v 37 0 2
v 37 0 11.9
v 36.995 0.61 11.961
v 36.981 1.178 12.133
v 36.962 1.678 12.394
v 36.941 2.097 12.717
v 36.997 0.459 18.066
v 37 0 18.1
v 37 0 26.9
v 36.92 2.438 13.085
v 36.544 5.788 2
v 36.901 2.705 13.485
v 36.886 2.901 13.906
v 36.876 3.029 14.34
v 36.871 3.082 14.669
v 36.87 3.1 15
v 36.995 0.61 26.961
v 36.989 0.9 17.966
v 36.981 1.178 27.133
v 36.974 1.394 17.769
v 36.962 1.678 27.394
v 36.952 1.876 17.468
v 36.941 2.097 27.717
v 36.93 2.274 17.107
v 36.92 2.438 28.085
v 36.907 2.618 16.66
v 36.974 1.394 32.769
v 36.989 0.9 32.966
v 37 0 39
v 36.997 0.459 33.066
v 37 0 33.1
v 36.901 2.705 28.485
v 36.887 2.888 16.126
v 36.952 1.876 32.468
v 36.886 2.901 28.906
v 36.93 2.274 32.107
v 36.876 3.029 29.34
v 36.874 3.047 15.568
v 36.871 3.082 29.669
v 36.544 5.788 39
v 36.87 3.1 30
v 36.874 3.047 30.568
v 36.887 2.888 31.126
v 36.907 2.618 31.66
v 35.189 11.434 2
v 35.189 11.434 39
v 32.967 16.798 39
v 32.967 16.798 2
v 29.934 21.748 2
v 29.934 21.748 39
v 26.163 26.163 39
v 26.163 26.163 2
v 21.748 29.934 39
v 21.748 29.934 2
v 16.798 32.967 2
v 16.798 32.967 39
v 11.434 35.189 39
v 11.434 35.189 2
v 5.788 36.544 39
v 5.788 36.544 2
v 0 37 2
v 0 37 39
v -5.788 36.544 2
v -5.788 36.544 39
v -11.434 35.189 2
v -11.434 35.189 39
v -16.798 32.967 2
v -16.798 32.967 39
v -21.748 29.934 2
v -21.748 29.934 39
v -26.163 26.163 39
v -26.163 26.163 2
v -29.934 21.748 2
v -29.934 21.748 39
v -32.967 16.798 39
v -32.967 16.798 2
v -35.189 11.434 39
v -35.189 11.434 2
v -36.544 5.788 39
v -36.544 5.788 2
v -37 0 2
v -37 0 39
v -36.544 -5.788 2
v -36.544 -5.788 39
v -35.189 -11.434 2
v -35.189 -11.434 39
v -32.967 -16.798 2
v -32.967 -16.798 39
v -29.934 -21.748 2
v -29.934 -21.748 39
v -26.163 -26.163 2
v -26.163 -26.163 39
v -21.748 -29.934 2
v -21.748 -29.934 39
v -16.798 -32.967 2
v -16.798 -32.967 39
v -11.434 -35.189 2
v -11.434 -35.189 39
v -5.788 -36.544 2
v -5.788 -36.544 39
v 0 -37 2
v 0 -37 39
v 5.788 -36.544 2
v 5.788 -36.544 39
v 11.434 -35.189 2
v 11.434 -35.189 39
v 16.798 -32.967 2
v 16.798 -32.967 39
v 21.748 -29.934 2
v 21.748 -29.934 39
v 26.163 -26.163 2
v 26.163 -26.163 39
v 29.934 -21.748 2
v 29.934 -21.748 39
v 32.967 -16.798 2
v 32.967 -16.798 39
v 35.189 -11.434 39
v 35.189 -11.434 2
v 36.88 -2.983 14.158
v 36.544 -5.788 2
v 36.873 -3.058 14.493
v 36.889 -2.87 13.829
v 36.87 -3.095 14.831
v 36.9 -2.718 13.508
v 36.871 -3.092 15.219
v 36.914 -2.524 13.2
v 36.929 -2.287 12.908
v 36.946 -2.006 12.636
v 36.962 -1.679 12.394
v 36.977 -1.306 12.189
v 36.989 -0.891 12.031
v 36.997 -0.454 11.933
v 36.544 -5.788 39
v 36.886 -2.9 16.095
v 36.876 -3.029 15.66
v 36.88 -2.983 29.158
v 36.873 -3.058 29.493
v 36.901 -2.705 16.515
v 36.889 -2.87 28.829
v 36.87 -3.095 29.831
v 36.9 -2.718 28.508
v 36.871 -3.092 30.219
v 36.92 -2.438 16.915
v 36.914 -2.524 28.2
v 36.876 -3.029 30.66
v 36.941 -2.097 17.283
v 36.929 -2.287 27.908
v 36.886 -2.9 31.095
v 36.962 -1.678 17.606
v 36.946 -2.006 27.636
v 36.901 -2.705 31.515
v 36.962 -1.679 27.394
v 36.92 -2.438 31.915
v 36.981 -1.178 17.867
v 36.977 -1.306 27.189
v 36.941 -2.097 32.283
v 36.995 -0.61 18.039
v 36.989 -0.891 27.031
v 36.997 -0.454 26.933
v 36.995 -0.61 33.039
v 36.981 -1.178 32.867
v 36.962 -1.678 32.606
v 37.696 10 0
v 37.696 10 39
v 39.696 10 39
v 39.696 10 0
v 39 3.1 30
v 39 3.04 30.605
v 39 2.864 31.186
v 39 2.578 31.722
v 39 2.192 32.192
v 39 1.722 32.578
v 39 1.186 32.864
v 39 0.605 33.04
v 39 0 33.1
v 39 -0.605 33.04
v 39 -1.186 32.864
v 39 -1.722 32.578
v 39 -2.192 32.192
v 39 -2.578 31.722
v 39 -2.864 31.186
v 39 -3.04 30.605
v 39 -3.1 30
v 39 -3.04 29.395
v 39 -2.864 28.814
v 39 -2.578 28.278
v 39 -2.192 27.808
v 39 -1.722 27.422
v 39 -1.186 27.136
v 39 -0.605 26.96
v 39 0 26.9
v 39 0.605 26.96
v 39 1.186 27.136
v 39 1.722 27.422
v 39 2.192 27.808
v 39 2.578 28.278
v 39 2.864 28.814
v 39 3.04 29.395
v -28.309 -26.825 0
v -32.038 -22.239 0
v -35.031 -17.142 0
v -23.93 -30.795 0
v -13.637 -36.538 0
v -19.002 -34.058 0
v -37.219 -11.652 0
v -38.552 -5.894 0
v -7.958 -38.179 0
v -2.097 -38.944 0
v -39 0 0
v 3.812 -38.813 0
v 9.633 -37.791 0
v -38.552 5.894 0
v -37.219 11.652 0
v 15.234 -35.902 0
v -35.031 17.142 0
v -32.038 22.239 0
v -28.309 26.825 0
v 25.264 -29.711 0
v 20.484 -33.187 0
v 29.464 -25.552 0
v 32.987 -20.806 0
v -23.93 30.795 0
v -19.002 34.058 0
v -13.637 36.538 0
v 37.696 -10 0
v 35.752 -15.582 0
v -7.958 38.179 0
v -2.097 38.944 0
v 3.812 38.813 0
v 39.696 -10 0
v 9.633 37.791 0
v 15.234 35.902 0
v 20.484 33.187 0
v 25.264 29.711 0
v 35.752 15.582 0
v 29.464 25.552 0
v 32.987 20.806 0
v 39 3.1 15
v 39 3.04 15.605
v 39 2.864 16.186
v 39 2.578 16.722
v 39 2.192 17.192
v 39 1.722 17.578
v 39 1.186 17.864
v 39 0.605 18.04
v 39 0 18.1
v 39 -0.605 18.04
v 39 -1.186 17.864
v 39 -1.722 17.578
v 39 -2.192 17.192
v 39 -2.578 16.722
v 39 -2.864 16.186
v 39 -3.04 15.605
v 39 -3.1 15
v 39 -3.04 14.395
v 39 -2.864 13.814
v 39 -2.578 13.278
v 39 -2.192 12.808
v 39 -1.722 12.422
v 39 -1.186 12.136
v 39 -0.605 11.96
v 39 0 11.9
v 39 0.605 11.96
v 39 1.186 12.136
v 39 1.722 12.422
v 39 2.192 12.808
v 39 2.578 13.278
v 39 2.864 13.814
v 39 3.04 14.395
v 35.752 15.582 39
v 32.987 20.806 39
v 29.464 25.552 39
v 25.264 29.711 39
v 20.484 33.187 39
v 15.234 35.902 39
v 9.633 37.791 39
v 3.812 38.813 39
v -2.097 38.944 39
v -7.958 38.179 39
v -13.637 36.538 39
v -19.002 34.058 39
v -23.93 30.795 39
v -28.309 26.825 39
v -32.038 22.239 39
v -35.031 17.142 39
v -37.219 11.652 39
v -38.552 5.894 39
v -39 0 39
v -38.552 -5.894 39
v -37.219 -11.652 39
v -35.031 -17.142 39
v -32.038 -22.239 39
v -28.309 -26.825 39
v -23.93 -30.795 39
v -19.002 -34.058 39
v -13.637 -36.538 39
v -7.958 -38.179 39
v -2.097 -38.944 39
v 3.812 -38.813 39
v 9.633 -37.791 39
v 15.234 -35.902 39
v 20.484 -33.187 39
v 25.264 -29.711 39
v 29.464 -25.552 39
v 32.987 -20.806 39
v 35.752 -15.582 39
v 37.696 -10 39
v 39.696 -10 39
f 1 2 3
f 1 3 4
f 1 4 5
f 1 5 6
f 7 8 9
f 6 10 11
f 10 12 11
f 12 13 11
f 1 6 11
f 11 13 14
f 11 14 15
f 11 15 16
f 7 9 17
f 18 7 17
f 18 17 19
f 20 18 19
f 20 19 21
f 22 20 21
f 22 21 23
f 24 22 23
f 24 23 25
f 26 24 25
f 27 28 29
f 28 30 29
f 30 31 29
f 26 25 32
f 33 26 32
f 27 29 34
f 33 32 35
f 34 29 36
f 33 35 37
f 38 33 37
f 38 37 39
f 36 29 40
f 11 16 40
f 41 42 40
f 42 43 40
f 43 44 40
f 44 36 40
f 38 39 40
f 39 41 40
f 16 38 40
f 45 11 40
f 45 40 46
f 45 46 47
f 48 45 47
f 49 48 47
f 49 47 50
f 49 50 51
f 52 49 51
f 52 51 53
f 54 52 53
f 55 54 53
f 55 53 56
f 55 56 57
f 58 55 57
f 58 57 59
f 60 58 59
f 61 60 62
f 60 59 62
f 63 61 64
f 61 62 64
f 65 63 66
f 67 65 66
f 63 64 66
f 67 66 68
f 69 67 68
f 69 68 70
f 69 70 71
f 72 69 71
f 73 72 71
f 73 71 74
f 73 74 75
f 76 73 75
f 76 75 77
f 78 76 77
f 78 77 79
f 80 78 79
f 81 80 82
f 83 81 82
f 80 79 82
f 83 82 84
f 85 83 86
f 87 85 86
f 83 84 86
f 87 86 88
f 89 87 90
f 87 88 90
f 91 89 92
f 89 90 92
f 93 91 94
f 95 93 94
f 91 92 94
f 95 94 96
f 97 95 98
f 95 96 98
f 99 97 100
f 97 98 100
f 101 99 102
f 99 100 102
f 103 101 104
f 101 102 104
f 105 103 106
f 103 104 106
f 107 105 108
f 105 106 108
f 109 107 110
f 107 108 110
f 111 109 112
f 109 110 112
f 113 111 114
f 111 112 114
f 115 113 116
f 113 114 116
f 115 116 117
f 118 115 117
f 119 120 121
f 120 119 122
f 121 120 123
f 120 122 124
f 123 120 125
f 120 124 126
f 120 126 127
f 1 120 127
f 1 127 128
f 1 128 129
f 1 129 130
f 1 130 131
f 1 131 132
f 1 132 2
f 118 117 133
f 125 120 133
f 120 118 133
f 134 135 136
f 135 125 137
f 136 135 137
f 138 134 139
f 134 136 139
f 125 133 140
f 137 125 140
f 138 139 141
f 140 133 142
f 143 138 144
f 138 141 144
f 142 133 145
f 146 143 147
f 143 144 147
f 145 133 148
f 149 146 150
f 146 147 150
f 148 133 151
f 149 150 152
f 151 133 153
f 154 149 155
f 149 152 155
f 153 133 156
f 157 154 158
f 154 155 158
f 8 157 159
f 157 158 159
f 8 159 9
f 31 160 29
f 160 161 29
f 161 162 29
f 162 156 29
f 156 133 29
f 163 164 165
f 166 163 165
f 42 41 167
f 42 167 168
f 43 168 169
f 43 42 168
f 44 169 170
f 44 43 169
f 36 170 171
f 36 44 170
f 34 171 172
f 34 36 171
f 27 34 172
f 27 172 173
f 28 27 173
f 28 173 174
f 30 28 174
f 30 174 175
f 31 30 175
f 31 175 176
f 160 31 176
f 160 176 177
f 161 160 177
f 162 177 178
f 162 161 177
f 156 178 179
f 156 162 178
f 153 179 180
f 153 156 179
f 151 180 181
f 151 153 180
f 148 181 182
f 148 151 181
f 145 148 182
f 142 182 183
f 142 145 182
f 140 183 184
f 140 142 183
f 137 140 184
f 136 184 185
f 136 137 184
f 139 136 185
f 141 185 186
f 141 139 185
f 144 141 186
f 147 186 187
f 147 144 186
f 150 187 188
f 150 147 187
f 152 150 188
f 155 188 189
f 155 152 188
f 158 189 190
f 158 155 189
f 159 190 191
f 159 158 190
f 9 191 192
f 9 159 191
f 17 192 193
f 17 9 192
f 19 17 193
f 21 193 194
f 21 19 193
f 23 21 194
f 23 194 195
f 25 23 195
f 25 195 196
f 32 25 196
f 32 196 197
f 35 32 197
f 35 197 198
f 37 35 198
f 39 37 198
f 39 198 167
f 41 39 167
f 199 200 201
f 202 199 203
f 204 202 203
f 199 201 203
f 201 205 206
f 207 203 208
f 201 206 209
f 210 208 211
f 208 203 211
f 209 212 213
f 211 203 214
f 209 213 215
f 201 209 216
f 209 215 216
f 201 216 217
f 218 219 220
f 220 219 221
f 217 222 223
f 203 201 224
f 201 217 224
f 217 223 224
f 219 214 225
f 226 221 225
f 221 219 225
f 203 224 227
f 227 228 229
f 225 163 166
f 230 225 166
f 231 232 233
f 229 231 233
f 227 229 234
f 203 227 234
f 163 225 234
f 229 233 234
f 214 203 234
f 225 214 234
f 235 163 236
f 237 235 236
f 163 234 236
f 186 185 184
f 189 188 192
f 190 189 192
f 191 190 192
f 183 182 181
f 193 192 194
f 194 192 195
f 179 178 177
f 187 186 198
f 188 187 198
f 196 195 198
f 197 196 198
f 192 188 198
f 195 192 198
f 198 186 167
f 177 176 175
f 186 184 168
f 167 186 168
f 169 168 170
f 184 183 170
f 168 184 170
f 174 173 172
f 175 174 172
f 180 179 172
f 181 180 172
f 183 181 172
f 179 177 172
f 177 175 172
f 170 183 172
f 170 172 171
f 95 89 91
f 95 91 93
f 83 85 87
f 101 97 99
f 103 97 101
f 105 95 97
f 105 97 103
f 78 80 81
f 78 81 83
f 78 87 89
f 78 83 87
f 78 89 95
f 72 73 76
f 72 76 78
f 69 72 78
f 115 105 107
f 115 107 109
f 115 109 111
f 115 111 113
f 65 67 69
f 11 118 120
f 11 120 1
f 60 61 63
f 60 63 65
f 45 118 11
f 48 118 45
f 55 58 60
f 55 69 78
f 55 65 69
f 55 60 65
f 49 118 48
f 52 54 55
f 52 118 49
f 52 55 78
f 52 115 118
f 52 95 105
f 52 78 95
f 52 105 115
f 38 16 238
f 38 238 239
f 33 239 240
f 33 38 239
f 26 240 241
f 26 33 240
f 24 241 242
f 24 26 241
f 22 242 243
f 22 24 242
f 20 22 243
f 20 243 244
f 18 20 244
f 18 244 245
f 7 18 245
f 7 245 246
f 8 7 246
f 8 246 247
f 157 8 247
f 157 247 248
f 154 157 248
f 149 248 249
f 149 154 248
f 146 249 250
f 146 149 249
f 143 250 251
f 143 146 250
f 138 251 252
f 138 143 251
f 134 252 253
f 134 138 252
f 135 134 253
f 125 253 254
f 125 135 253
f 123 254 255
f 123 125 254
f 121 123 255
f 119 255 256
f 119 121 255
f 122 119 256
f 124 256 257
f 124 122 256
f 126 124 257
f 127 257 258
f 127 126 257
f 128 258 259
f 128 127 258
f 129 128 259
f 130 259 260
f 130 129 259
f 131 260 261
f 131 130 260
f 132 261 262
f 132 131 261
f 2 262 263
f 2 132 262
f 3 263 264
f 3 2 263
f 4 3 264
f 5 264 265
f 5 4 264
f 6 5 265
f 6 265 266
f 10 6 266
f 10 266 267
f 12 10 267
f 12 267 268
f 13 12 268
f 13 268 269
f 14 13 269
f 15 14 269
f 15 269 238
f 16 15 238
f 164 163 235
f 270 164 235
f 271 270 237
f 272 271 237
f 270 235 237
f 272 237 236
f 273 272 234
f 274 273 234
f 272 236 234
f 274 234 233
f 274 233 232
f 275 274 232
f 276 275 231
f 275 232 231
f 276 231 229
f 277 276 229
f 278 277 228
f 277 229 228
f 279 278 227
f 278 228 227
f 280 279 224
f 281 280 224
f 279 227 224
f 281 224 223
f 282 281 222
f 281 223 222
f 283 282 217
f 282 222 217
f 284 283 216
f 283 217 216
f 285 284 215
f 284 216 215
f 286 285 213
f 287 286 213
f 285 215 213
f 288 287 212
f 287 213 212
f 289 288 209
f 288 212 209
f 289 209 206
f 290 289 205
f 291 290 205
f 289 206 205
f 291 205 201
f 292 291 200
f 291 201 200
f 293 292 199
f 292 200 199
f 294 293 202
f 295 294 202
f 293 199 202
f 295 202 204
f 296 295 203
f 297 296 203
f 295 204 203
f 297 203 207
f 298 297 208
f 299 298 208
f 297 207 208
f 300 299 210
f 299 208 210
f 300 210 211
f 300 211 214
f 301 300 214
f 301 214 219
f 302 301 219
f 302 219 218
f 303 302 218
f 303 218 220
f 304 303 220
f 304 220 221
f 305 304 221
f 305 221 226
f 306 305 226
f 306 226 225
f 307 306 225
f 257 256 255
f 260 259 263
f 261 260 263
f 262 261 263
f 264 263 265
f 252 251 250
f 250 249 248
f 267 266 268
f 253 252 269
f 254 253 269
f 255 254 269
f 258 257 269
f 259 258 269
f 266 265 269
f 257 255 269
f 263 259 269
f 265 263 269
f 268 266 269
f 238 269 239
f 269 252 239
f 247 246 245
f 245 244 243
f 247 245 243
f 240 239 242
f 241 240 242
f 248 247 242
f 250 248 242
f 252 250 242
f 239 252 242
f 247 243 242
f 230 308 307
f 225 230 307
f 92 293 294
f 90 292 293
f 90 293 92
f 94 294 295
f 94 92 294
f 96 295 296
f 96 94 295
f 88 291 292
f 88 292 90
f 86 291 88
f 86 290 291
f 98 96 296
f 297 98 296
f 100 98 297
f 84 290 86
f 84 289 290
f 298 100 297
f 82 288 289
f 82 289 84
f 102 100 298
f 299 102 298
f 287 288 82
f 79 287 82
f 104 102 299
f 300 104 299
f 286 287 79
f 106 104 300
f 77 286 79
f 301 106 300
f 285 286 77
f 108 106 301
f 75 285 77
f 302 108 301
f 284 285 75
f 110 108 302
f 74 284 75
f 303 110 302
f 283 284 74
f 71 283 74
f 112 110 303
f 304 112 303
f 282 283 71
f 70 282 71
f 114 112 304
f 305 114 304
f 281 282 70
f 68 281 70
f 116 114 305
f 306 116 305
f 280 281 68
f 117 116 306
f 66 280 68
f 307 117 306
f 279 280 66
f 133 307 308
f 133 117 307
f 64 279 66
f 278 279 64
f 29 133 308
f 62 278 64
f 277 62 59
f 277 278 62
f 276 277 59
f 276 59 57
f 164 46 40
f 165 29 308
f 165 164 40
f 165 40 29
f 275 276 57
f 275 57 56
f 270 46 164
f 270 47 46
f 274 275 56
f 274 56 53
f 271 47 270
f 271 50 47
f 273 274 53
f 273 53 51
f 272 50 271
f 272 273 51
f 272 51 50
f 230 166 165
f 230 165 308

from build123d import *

# Parameters (mm, degrees)
SKETCH002_R  = 3.1
PAD001_DEPTH = 10
PAD_DEPTH    = 39
SKETCH001_R  = 37
POCKET_DEPTH = 37


with BuildPart() as pad001:
    # Sketch002 → Pad001 (new body)
    with BuildSketch(Plane.YZ.offset(29)):
        with Locations((0, 30)):
            Circle(SKETCH002_R)
        with Locations((0, 15)):
            Circle(SKETCH002_R)
    extrude(amount=PAD001_DEPTH)


with BuildPart() as cut:
    # Sketch → Pad (new body)
    with BuildSketch(Plane.XY):
        with BuildLine():
            ThreePointArc((37.696154, 10), (-39, 0), (37.696154, -10))
            Line((39.696154, -10), (37.696154, -10))
            Line((39.696154, 10), (39.696154, -10))
            Line((37.696154, 10), (39.696154, 10))
        make_face()
    extrude(amount=PAD_DEPTH)

    # Sketch001 → Pocket (cut)
    with BuildSketch(Plane.XY.offset(39)):
        Circle(SKETCH001_R)
    extrude(amount=-POCKET_DEPTH, mode=Mode.SUBTRACT)

    # Cut: cut Pad001
    add(pad001.part, mode=Mode.SUBTRACT)


solid = cut.part
